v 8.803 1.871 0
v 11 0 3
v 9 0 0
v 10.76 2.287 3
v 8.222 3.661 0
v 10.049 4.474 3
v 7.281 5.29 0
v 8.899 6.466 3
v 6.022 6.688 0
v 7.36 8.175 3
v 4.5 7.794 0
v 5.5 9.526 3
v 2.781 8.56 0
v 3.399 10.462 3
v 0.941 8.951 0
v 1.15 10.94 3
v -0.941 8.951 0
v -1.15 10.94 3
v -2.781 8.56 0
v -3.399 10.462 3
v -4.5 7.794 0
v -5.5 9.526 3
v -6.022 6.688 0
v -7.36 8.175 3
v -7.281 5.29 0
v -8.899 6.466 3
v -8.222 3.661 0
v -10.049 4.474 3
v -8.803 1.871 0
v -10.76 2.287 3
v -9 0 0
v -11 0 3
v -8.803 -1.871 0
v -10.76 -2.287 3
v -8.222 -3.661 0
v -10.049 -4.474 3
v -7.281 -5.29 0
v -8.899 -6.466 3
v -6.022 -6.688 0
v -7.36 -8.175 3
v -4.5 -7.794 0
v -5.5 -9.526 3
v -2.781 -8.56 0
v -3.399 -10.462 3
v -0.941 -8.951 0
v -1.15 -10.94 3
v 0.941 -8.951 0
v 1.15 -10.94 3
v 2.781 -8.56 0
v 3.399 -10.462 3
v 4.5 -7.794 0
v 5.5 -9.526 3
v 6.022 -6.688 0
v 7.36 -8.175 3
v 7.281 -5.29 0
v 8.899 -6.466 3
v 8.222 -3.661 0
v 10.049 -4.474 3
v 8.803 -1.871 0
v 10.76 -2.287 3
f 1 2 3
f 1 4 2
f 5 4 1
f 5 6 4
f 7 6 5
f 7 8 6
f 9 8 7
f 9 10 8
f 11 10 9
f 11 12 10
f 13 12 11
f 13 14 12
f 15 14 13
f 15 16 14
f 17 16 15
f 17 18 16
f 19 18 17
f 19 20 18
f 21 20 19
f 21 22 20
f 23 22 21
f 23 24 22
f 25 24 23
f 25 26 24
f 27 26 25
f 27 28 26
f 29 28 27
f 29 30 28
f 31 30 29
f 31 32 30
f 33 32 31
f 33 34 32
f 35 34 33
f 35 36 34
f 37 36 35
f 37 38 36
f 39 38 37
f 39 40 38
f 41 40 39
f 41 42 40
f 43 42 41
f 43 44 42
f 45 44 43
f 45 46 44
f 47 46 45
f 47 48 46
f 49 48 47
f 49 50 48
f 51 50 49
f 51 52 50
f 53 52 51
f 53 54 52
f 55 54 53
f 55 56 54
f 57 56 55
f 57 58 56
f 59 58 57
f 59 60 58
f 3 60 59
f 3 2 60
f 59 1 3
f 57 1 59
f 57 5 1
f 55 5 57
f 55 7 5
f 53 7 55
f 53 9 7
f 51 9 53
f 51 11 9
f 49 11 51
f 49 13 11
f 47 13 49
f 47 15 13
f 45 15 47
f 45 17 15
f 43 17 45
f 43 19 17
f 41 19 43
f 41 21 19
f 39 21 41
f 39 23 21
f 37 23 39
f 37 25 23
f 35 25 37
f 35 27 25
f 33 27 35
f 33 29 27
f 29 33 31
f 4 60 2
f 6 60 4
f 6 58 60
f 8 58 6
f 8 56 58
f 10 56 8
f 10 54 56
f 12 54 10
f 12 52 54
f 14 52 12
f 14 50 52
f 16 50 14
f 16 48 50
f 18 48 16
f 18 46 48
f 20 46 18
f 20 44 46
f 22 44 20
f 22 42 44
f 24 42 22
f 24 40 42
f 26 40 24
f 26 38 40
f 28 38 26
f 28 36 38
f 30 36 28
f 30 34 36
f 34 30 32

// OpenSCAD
// Generated by SolidPython 1.0.1 on 2020-07-29 00:02:42


cylinder(h = 3, r1 = 9, r2 = 11);
/***********************************************
*********      SolidPython code:      **********
************************************************
 
# import packages: SolidPython
from solid import *
from solid.utils import *
from itertools import chain, combinations


class Resize:

    def __init__(self, scad_file):
        self.scad_file = scad_file
        #self.scad_file = import_scad(scad_file)
        # cone/cylinder param:
        self.r1 = 0
        self.r2 = 0
        self.h = 0
        # rectangular prism param:
        self.w = 0
        self.l = 0
        # ellipse param:
        self.r = 0

    # import OpenScad code (file name corresponds to shape)


    # classify shape + parameters
    def assign(self, param1, param2, param3):
        if self.scad_file == 'cone.scad':
            self.r1 = param1
            self.r2 = param2
            self.h = param3
        elif self.scad_file == 'cylinder.scad':
            self.r1 = param1
            self.r2 = param2
            self.h = param3
        elif self.scad_file == 'rectangularPrism.scad':
            self.h = param1
            self.l = param2
            self.w = param3
        else:
            self.r = param1
            self.h = param2

    # resize parameters
    def iterate(self):
        x = range(3, 20, 2)
        i = 1
        if self.scad_file == 'cone.scad':
            tempList = list(combinations(x, 3))
            #print(tempList)
            for i in x:
                for j in range (3):
                    param1 = tempList[i][0]
                    param2 = tempList[i][1]
                    param3 = tempList[i][2]
                    filepath = 'produced_scad_files/' + 'cone' + str(param1) + '_' + str(param2) + '_' + str(param3) + '.scad'
                    scad_render_to_file(cylinder(h=param1, r1=param2, r2=param3), filepath)

        elif self.scad_file == 'cylinder.scad':
            tempList = list(combinations(x, 3))
            for i in x:
                for j in range(3):
                    param1 = tempList[i][0]
                    param2 = tempList[i][1]
                    param3 = tempList[i][2]
                    filepath = 'produced_scad_files/' + 'cylinder' + str(param1) + '_' + str(param2) + '_' + str(param3) + '.scad'
                    scad_render_to_file(cylinder(h=param1, r1=param2, r2=param3), filepath)

        elif self.scad_file == 'rectangularPrism.scad':
            tempList = list(combinations(x, 3))
            for i in x:
                for j in range(3):
                    param1 = tempList[i][0]
                    param2 = tempList[i][1]
                    param3 = tempList[i][2]
                    filepath = 'produced_scad_files/' + 'rectangularPrism' + str(param1) + '_' + str(param2) + '_' + str(
                        param3) + '.scad'
                    scad_render_to_file(cube(size=(param1, param2, param3)), filepath)

        else:
            tempList = list(combinations(x, 2))
            for i in x:
                for j in range(3):
                    param1 = tempList[i][0]
                    param2 = tempList[i][1]
                    filepath = 'produced_scad_files/' + 'ellipse' + str(param1) + '_' + str(param2) + '_' + '.scad'
                    scad_render_to_file(sphere(param1, param2), filepath)

    def render_to_scadfile(self):
        scad_render_to_file(scad, 'example.scad') 
 
************************************************/
